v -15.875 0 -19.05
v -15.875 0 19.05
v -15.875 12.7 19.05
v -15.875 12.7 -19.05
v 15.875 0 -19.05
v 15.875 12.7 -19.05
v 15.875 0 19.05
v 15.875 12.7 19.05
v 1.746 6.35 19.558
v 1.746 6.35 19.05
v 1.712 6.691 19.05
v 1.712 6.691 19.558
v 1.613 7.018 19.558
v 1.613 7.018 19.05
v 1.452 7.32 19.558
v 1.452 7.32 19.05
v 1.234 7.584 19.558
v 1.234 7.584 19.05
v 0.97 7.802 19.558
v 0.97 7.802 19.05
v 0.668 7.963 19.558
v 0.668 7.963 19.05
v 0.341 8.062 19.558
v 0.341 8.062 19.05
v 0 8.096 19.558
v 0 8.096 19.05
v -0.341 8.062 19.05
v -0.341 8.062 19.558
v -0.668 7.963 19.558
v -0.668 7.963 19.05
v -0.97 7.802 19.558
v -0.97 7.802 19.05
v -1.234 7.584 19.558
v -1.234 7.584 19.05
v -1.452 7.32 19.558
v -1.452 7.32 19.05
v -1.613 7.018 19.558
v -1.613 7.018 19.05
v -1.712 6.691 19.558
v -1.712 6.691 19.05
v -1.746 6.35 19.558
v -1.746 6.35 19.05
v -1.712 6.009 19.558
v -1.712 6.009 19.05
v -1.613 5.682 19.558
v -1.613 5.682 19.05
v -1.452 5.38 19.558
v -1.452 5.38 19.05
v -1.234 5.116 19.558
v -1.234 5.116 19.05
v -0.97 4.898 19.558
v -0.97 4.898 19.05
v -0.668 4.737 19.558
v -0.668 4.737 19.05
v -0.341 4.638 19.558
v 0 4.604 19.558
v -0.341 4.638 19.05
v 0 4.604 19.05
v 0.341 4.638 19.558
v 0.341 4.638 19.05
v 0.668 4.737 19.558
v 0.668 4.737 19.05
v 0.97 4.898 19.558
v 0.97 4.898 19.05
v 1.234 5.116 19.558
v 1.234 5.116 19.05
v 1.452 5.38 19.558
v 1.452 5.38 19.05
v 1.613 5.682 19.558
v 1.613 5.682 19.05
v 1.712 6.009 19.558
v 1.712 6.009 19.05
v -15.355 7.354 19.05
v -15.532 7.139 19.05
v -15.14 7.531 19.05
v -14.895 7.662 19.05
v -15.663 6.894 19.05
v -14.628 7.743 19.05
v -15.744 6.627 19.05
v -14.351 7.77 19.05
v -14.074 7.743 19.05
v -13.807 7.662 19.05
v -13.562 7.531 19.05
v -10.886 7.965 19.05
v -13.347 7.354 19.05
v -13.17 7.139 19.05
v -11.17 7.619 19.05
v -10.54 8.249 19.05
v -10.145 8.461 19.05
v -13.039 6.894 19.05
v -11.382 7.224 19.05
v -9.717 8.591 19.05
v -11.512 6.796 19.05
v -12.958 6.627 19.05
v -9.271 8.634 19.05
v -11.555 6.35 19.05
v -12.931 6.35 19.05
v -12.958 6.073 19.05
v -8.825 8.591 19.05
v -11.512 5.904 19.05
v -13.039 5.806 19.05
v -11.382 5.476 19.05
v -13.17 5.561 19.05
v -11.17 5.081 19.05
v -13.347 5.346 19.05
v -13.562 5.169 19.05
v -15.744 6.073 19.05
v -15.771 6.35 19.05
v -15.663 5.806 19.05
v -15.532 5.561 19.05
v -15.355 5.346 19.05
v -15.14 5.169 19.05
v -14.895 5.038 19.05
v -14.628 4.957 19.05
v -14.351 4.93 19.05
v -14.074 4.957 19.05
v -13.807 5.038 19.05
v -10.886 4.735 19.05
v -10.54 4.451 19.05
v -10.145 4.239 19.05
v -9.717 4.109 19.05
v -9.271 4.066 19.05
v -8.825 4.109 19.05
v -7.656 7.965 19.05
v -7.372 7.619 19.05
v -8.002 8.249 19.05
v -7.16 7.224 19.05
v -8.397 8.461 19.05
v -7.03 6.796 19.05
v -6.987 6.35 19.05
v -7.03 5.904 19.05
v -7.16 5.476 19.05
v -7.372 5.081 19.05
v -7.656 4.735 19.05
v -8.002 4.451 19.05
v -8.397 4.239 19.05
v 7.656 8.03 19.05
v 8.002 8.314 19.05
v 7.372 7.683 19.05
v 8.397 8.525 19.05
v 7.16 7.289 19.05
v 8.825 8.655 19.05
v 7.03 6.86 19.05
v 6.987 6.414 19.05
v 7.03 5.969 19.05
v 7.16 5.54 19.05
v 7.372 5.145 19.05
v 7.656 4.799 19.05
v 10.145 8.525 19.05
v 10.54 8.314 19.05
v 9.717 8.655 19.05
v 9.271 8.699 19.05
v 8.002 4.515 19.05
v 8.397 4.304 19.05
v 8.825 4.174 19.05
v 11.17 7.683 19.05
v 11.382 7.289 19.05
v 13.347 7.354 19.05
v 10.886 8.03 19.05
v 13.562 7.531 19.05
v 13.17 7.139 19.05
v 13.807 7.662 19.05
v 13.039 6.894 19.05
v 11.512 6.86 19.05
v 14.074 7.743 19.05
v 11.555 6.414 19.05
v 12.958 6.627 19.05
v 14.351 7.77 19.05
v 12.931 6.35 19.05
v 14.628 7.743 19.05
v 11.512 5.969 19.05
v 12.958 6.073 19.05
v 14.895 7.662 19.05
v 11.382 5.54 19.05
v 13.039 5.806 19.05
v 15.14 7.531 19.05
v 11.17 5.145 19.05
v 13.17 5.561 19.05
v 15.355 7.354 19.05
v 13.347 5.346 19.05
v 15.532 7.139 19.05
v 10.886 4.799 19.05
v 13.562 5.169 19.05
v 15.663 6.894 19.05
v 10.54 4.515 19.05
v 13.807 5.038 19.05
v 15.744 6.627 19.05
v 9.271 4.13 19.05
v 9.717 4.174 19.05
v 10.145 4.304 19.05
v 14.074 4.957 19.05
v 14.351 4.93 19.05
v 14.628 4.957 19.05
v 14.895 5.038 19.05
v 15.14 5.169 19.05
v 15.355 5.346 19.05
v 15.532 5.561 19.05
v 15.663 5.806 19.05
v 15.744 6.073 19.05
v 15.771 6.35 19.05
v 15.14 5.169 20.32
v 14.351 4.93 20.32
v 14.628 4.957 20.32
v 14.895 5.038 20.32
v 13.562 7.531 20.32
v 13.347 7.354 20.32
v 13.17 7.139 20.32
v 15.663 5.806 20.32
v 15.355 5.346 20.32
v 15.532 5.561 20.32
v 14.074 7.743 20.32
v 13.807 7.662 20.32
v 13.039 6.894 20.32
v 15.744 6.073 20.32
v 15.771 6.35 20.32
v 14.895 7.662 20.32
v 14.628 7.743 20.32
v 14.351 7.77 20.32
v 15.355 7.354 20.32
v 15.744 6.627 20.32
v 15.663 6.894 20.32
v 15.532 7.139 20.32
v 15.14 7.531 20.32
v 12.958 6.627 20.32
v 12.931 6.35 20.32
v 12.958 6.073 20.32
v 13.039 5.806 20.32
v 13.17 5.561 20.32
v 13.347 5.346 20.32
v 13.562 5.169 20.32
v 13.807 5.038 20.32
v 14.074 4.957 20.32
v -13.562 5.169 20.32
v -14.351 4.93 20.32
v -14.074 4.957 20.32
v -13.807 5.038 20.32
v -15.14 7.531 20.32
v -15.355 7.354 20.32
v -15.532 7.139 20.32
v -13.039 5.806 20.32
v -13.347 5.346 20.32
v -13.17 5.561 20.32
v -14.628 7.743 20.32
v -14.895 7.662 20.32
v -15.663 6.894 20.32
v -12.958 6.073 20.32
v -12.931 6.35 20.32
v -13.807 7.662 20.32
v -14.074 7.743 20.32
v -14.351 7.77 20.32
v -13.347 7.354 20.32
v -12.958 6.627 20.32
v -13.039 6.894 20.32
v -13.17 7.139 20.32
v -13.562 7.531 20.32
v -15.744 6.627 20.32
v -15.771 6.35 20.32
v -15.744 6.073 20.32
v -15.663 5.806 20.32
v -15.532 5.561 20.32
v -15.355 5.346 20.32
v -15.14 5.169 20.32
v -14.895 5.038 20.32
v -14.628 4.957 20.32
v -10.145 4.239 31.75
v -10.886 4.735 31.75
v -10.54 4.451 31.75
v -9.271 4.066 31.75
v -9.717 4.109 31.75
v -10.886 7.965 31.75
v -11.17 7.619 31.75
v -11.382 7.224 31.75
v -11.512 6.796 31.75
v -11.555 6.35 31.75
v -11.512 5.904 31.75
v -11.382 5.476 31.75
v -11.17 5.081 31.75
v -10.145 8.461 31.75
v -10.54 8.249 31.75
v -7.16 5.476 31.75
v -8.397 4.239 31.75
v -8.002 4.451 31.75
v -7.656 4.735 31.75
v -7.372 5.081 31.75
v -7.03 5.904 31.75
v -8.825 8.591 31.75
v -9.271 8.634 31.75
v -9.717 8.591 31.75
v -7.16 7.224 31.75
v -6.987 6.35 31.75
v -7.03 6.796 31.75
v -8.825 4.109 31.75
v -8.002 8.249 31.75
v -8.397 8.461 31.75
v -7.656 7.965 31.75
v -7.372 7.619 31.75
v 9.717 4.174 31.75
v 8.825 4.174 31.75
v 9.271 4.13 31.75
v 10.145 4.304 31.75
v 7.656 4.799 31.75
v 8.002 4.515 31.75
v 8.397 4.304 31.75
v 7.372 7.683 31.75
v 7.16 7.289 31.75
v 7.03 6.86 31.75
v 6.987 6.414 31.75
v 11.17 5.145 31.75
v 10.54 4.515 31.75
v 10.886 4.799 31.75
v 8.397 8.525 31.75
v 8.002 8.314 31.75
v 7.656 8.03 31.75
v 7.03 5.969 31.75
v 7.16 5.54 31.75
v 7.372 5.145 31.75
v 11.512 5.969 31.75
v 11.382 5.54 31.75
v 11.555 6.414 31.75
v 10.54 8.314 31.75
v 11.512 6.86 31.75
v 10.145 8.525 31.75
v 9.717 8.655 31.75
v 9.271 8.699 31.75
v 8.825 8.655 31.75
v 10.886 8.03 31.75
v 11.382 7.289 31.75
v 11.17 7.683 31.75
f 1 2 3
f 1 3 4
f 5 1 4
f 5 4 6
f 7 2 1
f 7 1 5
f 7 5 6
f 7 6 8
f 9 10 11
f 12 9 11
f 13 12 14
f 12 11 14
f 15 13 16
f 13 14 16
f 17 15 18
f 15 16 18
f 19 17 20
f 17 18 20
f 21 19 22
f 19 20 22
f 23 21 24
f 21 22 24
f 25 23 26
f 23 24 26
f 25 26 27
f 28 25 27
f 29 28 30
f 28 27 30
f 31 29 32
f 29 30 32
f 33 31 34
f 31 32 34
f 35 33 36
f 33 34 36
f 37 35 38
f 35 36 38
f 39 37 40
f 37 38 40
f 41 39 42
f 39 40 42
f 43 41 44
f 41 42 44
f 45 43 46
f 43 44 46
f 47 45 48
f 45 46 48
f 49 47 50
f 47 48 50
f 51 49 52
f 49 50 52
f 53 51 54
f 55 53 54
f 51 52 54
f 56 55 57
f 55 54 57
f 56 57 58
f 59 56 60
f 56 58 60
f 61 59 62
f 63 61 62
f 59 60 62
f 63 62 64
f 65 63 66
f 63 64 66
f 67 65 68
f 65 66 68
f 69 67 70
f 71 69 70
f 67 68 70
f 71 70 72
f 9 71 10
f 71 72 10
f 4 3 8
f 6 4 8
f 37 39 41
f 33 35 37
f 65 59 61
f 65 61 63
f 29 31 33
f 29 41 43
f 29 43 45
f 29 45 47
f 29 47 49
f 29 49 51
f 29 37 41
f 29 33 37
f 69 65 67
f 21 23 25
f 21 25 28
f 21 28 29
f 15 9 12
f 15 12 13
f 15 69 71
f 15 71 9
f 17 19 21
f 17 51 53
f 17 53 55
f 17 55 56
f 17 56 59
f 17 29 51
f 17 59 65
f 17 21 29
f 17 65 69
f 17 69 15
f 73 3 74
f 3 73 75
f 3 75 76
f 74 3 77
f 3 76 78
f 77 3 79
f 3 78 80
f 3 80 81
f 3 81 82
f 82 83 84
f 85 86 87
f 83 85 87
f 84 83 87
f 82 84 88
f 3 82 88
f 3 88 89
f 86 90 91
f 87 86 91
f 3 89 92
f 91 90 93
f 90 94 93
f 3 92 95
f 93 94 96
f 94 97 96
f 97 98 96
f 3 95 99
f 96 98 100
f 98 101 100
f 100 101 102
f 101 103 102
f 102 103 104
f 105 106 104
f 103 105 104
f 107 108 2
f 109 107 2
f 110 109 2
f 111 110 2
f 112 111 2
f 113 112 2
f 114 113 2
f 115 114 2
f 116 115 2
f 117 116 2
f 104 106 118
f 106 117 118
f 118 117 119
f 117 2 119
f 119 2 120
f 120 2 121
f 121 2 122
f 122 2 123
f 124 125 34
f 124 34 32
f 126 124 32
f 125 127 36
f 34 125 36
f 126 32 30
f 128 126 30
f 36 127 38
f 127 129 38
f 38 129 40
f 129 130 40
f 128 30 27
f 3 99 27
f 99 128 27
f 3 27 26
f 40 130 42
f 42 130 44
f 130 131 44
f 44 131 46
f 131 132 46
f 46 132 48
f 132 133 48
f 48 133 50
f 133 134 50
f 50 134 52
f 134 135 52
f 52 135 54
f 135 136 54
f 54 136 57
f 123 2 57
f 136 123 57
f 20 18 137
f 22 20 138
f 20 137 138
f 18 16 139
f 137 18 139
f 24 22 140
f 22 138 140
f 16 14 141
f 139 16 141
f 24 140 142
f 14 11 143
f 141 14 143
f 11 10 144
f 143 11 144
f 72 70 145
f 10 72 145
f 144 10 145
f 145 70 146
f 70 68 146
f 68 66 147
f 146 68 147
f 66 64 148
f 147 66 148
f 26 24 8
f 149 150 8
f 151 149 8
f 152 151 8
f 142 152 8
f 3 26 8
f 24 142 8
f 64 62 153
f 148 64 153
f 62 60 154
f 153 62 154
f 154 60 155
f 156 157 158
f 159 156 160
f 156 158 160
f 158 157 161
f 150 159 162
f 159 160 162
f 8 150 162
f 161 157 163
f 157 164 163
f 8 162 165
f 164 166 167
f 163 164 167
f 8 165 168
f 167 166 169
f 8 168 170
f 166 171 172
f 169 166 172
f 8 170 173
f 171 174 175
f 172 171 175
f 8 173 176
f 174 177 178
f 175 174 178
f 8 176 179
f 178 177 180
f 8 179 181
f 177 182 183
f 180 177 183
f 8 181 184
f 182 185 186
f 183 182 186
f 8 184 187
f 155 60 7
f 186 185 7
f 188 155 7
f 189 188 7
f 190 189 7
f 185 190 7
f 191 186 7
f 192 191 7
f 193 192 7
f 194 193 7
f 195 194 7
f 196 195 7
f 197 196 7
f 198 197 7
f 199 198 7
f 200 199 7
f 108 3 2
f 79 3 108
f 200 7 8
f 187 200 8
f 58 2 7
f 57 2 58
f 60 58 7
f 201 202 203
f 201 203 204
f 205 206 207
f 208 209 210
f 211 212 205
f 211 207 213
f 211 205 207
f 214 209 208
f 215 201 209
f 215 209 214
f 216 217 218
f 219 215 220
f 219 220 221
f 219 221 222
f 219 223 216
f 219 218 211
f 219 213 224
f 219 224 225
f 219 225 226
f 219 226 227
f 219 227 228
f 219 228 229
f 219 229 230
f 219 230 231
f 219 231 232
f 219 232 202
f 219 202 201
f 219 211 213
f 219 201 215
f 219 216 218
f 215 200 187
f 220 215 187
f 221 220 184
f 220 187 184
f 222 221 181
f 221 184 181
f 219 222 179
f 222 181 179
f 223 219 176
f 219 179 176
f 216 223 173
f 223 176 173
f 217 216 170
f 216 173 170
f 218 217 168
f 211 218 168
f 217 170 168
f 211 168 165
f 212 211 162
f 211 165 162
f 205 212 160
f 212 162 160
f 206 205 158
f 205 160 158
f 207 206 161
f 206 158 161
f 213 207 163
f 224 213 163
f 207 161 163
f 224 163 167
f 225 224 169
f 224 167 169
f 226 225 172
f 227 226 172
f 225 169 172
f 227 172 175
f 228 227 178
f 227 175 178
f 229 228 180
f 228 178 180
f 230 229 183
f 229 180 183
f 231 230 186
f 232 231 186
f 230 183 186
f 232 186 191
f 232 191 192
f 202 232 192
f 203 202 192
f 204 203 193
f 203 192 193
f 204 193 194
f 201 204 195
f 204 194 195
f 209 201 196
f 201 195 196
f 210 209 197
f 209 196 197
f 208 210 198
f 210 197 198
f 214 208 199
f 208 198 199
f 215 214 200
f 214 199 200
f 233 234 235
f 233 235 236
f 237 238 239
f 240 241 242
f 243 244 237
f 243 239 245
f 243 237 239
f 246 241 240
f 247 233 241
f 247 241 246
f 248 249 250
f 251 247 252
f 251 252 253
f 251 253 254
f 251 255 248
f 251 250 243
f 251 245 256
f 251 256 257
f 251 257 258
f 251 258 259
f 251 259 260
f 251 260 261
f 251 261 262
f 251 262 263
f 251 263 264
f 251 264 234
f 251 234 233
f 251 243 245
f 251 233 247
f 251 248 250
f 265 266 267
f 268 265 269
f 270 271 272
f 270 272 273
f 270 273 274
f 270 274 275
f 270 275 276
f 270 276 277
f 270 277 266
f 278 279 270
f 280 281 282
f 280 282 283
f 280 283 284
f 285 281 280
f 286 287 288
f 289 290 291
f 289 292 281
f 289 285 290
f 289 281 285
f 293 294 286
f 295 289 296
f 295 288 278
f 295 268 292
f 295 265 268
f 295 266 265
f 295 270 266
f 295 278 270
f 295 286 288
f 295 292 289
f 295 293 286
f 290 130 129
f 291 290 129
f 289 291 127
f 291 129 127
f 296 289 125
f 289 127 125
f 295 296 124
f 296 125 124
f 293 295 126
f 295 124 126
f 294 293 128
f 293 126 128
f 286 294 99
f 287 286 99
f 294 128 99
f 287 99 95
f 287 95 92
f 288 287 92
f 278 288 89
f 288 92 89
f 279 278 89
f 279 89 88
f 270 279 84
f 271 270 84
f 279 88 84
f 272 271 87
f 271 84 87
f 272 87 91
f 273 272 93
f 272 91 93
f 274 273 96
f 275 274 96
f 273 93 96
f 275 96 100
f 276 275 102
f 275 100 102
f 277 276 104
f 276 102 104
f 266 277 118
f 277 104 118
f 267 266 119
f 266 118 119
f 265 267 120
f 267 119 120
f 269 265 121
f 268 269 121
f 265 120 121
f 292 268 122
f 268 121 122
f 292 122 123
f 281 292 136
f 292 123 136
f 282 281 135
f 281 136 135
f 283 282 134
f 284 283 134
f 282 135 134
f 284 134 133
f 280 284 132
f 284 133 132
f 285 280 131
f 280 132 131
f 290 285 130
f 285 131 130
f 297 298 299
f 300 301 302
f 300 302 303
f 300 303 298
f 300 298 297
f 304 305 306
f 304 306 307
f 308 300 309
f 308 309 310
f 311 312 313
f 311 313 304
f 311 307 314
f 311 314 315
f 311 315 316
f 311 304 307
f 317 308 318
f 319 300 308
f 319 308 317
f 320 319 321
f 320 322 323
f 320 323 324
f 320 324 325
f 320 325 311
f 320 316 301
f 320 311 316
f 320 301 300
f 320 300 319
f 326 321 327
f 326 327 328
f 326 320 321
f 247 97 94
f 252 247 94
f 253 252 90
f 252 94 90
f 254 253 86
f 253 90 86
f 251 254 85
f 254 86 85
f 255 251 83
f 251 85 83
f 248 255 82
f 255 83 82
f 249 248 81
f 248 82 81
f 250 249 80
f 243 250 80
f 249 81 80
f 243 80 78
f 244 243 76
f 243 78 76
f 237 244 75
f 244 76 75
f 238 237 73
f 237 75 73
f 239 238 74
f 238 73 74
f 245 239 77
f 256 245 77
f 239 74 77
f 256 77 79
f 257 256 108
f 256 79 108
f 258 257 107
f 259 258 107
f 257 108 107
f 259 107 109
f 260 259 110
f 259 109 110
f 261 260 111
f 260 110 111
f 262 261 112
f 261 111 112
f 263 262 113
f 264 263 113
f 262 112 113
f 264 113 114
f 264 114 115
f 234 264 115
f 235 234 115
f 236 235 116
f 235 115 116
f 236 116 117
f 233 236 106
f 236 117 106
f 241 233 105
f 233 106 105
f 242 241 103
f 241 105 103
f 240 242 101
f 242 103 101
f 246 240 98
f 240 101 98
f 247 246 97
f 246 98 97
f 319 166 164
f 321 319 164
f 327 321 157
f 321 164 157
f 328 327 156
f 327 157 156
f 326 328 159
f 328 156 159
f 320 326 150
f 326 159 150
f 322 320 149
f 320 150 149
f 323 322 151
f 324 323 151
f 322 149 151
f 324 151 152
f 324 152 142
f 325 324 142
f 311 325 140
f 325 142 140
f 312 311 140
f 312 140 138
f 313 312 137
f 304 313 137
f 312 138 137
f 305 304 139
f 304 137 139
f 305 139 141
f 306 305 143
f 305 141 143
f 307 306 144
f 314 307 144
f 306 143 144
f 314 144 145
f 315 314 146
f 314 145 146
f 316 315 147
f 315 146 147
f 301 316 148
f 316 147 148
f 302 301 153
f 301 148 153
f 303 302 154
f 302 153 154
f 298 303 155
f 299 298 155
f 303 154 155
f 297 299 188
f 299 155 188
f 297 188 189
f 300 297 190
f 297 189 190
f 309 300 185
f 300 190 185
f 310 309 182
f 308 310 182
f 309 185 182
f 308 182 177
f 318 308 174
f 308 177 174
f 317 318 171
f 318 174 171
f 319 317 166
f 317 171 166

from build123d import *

# Parameters (mm, degrees)
F0_W     = 31.75
F0_H     = 6.35
F1_DEPTH = 12.7
F2_R     = 1.4204821808
F3_DEPTH = 1.27
F2_R_2   = 1.7458442661
F4_DEPTH = 0.508
F2_R_3   = 2.2844516469
F6_DEPTH = 12.7


# Not quite as in the source:
# - the program builds the solid bodies; features that only make, move or delete a surface that nothing else refers to are left out


with BuildPart() as f1:
    # F0 (on Front) → F1 (new body)
    with BuildSketch(Plane.XZ):
        with Locations((0, 15.875)):
            Rectangle(F0_W, F0_H)
        with Locations((0, 9.525)):
            Rectangle(F0_W, F0_H)
        with Locations((0, 3.175)):
            Rectangle(F0_W, F0_H)
        with Locations((0, -3.175)):
            Rectangle(F0_W, F0_H)
        with Locations((0, -9.525)):
            Rectangle(F0_W, F0_H)
        with Locations((0, -15.875)):
            Rectangle(F0_W, F0_H)
    extrude(amount=-F1_DEPTH)

    # F2 (on face) → F3 (join)
    with BuildSketch(Plane.XY.offset(19.05)):
        with Locations((-14.351, 6.35)):
            Circle(F2_R)
        with Locations((14.351, 6.35)):
            Circle(F2_R)
    extrude(amount=F3_DEPTH)

    # F2 (on face) → F4 (join)
    with BuildSketch(Plane.XY.offset(19.05)):
        with Locations((0, 6.35)):
            Circle(F2_R_2)
    extrude(amount=F4_DEPTH)

    # F2 (on face) → F6 (join)
    with BuildSketch(Plane.XY.offset(19.05)):
        with Locations((-9.271, 6.35)):
            Circle(F2_R_3)
        with Locations((9.271, 6.4142975025)):
            Circle(F2_R_3)
    extrude(amount=F6_DEPTH)


solid = f1.part
